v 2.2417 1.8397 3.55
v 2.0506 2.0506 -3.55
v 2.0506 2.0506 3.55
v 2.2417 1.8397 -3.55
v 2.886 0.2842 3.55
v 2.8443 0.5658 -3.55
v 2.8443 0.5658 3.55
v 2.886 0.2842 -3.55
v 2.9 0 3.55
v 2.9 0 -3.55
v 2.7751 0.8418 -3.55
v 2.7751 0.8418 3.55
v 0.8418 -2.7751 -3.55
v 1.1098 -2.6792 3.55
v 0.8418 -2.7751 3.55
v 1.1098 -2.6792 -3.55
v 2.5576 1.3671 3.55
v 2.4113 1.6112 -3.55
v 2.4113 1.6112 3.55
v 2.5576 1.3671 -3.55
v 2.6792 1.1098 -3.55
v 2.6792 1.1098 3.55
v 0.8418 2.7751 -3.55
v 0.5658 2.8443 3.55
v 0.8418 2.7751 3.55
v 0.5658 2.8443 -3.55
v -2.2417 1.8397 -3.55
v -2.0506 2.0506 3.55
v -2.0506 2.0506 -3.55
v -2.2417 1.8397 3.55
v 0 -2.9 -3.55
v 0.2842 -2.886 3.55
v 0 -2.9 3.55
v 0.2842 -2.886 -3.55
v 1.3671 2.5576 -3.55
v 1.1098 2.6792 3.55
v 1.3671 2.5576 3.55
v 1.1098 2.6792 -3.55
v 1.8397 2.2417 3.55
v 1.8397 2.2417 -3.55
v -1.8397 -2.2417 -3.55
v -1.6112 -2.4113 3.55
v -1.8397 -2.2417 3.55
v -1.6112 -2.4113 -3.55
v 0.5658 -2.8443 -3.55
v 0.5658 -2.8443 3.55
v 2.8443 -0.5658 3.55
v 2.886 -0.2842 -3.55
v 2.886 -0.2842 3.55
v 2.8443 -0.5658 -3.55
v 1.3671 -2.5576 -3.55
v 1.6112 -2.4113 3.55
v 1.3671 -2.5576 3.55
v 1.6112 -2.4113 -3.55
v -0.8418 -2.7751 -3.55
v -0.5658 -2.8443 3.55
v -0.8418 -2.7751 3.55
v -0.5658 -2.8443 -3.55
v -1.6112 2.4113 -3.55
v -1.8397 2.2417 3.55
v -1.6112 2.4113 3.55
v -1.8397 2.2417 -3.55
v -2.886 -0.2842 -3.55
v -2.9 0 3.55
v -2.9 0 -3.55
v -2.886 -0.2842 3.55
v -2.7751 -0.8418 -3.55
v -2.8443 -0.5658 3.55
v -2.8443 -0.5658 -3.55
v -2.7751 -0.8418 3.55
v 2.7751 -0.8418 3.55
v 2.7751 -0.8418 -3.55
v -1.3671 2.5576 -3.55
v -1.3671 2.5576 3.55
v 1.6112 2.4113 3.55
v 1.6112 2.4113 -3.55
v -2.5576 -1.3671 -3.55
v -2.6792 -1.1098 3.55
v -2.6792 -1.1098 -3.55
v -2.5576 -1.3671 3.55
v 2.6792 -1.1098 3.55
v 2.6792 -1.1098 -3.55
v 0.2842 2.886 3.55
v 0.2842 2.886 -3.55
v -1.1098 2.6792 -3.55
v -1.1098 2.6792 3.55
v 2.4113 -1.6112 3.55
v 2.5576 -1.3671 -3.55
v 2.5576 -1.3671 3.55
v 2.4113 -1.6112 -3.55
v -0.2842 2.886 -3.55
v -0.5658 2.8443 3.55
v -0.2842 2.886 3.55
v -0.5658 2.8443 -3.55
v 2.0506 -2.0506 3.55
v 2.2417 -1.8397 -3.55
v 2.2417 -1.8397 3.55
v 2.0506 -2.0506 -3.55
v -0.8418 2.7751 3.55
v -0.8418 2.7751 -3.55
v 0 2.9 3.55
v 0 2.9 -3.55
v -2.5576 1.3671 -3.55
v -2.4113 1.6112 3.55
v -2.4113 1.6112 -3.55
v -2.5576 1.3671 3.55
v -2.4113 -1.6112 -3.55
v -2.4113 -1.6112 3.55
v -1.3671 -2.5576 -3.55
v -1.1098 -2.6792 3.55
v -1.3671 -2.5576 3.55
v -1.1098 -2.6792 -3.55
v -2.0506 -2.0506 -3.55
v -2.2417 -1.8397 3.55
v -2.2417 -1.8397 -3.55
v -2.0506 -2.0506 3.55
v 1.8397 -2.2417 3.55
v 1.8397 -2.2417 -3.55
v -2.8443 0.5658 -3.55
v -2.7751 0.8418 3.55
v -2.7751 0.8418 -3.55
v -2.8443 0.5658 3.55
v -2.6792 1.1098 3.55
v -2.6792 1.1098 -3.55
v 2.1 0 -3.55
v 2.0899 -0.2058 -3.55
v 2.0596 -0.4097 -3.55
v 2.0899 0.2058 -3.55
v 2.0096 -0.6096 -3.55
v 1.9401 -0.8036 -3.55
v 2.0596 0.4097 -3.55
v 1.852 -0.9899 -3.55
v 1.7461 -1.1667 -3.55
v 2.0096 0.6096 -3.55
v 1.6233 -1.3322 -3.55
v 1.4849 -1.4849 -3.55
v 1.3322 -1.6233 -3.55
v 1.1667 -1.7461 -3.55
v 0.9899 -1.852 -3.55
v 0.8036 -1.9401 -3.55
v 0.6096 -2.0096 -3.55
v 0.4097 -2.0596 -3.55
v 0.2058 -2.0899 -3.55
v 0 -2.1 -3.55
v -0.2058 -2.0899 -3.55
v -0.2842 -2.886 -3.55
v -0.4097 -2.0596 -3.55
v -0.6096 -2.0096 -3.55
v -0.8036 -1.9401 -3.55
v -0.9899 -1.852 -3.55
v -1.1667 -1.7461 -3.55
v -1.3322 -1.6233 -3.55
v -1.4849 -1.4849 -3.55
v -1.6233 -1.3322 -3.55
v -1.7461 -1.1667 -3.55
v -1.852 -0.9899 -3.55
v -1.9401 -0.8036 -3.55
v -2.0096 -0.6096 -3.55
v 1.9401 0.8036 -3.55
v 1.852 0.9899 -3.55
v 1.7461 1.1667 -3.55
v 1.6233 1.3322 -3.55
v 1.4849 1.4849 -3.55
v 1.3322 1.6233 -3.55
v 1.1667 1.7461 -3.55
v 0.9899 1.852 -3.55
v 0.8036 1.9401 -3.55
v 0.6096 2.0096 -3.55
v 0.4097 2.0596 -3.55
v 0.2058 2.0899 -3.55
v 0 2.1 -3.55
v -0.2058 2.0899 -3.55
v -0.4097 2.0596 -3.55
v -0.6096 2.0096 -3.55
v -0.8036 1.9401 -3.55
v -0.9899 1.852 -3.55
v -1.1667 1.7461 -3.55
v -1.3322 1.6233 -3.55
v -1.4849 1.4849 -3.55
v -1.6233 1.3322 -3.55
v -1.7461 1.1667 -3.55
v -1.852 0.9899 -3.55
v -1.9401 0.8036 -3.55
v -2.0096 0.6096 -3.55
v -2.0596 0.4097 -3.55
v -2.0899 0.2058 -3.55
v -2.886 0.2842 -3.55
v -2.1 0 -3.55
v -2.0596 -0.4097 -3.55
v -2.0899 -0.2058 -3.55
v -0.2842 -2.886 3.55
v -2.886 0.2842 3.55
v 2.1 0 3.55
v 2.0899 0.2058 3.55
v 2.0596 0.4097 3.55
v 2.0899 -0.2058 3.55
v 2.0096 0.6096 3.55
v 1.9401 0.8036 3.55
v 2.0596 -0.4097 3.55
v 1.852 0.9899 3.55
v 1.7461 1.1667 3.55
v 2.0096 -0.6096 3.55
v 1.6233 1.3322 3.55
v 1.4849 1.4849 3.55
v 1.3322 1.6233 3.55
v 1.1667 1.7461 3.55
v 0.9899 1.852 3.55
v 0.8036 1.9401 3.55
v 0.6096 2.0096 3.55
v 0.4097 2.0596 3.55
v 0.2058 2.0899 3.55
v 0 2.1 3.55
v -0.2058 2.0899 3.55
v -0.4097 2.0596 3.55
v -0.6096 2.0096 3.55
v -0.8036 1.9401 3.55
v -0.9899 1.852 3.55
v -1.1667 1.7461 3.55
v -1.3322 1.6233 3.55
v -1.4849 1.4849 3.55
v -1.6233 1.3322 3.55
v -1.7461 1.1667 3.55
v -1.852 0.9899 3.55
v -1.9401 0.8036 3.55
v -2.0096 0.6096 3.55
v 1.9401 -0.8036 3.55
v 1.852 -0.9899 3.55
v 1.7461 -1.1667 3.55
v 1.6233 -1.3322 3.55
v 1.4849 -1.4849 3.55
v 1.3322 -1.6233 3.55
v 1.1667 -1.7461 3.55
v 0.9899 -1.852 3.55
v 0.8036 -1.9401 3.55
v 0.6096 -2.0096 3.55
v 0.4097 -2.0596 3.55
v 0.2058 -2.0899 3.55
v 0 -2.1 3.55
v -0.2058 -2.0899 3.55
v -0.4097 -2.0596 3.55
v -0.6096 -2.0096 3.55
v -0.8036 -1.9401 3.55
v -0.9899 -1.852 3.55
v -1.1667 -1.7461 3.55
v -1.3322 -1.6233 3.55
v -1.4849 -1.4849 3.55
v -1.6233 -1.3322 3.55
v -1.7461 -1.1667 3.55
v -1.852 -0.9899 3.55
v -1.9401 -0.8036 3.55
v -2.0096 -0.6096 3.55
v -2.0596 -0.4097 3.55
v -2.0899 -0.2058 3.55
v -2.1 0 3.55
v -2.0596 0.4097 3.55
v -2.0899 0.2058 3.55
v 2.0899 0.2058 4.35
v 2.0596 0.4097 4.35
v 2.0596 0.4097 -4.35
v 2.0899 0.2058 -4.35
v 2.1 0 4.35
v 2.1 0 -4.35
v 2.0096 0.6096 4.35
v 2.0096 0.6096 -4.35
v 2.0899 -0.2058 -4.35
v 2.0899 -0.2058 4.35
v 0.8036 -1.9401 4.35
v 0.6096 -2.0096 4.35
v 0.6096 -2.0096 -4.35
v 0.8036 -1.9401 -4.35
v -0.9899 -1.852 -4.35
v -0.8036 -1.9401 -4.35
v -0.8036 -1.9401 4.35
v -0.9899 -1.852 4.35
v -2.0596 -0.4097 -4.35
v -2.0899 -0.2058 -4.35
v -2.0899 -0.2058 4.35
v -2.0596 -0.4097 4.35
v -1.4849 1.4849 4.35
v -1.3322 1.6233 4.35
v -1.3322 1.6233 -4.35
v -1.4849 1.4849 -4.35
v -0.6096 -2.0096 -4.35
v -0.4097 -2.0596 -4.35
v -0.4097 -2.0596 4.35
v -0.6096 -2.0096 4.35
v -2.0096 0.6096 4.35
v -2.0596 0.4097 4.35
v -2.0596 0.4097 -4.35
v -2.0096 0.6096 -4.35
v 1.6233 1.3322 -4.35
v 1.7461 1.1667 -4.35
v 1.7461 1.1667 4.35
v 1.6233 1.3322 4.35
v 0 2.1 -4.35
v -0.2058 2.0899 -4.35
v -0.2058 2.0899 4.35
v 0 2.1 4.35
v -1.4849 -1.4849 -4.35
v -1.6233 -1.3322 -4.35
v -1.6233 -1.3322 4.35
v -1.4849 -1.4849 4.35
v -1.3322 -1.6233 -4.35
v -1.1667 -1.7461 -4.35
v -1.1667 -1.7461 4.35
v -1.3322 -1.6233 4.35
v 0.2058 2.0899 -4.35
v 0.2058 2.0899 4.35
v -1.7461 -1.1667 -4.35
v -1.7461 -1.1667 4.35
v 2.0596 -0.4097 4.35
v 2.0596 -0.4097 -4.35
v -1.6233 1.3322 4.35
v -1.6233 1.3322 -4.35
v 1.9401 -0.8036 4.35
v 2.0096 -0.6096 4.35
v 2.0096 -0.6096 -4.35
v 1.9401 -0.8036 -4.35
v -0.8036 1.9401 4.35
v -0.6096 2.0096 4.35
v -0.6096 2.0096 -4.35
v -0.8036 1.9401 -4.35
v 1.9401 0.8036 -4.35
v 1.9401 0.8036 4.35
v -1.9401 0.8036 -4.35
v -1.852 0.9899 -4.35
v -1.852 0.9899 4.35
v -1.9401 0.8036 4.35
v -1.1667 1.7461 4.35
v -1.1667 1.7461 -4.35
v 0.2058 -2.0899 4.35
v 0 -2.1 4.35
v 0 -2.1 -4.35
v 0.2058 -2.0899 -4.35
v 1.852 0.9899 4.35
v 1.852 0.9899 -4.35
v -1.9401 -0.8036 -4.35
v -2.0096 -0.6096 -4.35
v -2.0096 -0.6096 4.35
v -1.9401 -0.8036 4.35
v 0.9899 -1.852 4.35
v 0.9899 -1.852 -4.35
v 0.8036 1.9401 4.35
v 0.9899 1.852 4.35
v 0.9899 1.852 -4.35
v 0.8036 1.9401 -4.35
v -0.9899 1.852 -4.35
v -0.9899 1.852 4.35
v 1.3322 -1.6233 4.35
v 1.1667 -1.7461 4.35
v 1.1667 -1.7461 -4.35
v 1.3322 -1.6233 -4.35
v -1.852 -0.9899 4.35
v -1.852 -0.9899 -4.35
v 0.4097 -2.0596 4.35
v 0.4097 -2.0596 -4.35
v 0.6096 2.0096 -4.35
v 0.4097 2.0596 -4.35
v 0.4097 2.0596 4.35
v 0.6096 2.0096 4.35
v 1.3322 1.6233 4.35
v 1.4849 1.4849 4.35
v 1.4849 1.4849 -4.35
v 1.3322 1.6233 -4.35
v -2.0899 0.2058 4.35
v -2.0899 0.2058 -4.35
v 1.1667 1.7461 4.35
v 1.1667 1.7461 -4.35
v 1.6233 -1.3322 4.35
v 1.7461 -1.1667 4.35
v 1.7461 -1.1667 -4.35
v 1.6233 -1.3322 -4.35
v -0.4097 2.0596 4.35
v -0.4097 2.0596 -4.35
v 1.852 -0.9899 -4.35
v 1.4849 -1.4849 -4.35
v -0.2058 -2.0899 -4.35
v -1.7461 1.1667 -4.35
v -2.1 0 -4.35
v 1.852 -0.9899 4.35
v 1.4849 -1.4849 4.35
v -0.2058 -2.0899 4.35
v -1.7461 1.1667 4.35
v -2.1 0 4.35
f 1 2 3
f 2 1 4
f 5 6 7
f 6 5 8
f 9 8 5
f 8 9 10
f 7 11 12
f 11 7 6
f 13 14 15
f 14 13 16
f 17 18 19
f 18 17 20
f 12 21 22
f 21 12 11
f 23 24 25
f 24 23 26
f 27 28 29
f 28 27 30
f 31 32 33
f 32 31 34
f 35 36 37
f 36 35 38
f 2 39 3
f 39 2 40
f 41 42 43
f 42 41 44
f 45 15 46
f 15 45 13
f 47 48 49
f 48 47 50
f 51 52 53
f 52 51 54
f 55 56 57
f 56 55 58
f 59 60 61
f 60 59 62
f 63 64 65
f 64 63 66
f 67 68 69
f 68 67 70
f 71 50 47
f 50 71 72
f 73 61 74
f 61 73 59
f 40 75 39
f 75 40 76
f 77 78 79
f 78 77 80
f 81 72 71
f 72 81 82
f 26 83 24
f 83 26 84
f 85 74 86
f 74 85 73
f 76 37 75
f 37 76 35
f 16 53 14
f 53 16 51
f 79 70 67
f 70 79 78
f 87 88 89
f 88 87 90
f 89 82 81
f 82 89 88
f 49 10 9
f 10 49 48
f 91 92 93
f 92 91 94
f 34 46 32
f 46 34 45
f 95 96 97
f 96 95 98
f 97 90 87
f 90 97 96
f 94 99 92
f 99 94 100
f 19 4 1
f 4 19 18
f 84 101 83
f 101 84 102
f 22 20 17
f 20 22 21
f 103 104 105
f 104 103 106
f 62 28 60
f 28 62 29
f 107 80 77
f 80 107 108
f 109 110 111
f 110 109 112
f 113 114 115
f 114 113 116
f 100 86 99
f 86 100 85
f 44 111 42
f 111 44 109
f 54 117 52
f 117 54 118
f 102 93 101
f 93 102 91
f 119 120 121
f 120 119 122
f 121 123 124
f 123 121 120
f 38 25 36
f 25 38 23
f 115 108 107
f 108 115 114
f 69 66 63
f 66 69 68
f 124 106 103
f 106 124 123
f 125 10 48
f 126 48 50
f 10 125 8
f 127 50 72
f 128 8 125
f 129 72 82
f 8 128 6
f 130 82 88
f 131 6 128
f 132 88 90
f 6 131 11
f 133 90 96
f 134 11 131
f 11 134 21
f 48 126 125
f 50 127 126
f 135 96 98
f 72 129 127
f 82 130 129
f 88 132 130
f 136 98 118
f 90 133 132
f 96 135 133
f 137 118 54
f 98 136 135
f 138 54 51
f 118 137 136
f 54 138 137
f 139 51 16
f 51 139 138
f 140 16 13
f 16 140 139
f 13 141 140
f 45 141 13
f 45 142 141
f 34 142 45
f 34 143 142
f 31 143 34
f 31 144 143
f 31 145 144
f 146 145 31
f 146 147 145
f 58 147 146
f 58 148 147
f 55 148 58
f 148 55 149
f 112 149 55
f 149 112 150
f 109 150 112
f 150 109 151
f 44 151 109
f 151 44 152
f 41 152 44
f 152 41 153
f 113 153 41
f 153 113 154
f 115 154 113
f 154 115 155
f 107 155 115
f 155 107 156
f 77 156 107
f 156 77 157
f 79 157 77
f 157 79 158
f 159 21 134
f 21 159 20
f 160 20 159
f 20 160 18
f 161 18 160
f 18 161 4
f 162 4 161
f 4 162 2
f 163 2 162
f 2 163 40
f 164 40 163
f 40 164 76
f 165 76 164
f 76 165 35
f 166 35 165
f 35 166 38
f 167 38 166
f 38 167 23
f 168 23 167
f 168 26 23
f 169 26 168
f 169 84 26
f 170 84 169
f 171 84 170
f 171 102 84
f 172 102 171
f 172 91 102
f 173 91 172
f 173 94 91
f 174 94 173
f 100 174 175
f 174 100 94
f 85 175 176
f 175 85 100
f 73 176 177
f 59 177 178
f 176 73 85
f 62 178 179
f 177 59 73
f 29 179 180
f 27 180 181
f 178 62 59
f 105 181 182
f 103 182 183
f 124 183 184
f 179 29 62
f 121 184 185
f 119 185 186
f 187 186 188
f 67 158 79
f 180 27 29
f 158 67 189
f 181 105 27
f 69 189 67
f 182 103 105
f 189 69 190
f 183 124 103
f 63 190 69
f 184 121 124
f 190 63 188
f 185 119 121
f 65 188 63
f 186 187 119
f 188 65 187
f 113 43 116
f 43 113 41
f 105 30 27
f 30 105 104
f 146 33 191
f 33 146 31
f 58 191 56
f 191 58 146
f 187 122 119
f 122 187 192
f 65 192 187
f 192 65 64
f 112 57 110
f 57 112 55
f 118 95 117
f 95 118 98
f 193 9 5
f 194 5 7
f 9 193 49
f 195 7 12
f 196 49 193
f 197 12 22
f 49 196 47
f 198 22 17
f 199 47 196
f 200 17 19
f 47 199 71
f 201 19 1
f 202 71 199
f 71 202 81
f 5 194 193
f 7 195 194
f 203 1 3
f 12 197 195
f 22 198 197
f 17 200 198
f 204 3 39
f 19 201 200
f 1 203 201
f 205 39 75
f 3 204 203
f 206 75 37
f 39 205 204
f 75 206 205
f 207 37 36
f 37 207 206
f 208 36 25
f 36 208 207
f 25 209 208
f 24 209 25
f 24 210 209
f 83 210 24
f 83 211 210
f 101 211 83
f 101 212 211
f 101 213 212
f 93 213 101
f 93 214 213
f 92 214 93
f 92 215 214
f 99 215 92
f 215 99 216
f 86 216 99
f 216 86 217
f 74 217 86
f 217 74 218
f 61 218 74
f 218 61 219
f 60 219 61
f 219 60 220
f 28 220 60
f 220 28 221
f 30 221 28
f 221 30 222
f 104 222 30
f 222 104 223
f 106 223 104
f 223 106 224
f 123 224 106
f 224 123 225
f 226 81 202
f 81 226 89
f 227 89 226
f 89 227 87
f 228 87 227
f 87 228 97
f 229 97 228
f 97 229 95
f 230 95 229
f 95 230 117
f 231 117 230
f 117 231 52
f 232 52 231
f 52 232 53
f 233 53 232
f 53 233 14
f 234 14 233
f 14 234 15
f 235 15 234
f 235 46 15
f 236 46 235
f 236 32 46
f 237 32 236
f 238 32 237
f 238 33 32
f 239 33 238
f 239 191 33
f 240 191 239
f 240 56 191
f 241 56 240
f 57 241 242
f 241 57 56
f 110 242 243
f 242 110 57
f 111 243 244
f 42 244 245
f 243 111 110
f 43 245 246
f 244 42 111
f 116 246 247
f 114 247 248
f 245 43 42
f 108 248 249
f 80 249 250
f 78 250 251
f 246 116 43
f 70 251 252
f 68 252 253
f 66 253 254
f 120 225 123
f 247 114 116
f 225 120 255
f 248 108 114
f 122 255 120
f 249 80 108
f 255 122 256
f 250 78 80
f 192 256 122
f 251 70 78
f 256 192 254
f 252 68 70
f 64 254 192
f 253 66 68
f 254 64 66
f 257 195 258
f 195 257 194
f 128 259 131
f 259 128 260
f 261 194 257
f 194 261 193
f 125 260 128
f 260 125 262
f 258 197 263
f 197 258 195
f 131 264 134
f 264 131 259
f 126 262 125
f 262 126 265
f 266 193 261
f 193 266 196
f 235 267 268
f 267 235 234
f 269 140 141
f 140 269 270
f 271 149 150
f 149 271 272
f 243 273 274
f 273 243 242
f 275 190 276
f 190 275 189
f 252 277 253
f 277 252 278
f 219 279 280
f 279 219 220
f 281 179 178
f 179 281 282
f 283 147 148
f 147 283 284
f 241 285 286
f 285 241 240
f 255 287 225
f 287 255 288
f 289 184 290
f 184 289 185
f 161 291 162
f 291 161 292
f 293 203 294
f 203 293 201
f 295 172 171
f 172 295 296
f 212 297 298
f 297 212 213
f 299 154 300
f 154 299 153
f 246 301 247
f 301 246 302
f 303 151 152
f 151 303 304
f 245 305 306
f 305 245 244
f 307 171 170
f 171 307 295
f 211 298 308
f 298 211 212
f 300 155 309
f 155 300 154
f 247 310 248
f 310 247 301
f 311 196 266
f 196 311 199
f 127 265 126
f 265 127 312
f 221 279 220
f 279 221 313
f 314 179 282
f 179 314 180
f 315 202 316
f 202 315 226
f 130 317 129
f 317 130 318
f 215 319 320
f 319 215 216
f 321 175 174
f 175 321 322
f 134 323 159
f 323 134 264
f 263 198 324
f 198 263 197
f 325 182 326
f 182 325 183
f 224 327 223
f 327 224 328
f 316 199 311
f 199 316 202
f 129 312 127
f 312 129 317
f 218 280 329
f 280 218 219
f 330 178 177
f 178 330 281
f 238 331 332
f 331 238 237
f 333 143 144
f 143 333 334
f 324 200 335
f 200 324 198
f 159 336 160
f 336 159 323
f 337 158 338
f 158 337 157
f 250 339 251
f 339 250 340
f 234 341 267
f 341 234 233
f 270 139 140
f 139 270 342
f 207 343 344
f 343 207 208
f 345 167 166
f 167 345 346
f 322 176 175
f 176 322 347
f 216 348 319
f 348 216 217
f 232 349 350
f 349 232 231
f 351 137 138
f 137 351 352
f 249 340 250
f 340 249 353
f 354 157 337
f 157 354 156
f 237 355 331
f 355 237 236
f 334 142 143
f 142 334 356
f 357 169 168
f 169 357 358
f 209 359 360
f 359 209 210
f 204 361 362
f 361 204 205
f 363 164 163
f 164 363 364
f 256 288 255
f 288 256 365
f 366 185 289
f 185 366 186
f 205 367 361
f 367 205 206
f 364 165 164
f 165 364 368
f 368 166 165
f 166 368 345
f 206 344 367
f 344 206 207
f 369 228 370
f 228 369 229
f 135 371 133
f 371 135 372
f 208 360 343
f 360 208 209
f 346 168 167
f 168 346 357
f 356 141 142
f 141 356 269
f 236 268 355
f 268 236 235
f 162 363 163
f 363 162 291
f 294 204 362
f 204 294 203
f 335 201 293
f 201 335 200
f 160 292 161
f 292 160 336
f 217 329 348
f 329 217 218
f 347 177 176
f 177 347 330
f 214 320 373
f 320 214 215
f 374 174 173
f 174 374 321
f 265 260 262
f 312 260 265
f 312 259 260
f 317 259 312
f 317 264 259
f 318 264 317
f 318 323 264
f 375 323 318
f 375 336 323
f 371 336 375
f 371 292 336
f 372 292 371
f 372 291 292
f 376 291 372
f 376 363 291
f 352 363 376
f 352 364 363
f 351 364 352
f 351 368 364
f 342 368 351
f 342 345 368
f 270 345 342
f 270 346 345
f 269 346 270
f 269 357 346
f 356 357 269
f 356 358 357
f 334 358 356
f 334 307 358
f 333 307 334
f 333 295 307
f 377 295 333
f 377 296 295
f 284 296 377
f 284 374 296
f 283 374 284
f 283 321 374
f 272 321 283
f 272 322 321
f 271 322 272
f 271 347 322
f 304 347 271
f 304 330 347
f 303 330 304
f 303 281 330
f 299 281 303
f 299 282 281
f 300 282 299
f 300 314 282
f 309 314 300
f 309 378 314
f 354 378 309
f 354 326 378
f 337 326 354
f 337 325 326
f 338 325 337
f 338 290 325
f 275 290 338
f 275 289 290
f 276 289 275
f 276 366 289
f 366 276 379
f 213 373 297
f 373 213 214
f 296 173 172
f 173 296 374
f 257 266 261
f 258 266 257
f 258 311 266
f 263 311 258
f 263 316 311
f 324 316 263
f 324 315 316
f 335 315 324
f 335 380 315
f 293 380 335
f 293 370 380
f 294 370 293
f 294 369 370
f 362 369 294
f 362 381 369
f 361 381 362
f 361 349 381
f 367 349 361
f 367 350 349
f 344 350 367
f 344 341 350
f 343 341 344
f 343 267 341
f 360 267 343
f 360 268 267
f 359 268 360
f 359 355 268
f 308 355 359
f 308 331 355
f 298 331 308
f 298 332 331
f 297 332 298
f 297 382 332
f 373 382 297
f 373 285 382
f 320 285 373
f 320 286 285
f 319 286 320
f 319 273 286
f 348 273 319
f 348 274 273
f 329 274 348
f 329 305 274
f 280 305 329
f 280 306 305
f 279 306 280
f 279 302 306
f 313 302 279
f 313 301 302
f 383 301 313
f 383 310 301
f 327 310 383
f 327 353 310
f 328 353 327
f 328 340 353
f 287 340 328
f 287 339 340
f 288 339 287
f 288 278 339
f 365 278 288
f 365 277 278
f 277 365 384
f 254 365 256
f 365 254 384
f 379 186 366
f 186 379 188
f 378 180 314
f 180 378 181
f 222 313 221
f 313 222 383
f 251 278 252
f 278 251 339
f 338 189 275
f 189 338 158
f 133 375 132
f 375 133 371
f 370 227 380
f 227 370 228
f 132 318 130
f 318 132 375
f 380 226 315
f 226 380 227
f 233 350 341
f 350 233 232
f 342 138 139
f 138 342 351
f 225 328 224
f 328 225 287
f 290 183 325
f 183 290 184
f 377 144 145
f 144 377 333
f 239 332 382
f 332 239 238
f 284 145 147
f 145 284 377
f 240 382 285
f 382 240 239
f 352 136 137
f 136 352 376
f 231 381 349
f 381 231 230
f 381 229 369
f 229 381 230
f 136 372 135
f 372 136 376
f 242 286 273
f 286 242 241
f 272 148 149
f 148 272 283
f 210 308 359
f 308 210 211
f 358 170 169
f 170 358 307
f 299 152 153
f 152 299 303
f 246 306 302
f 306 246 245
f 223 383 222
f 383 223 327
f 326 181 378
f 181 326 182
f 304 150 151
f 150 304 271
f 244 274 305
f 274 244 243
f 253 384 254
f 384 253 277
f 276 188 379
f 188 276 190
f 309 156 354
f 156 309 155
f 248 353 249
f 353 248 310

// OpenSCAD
// Parameters
outer_diameter = 5.8; //[2.9:11.6:0.1]
length = 7.1; //[3.55:14.2:0.1]
screw_diameter = 5; //[2.5:10:0.1]
thread_pitch = 0.8; //[0.4:1.6:0.05]
internal_thread_diameter = 4.2; //[3.5:5:0.05]
chamfer_length = 0.5; //[0.25:1:0.05]
chamfer_angle_deg = 45; //[30:60:1]
overlap = 0.8; //[0.5:2:0.1]

// Threaded Insert - complete geometry
module threaded_insert() {
  color("Brass") {
    // Insert body with chamfers
    union() {
      // Main cylindrical body
      translate([0, 0, 0])
        cylinder(r=outer_diameter/2, h=length, center=true, $fn=64);
      
      // Lead-in chamfer
      translate([0, 0, length/2 - (chamfer_length + overlap)/2])
        cylinder(r1=outer_diameter/2, r2=outer_diameter/2 - chamfer_length, h=chamfer_length + overlap, center=true, $fn=64);
      
      // Installation end chamfer
      translate([0, 0, -length/2 + (chamfer_length + overlap)/2])
        cylinder(r1=outer_diameter/2 - chamfer_length, r2=outer_diameter/2, h=chamfer_length + overlap, center=true, $fn=64);
    }
    
    // Internal thread interface (clearance hole)
    difference() {
      translate([0, 0, 0])
        cylinder(r=internal_thread_diameter/2, h=length + 2*overlap, center=true, $fn=64);
    }
  }
}

// Assembly
module assembly() {
  threaded_insert();
}

assembly();
